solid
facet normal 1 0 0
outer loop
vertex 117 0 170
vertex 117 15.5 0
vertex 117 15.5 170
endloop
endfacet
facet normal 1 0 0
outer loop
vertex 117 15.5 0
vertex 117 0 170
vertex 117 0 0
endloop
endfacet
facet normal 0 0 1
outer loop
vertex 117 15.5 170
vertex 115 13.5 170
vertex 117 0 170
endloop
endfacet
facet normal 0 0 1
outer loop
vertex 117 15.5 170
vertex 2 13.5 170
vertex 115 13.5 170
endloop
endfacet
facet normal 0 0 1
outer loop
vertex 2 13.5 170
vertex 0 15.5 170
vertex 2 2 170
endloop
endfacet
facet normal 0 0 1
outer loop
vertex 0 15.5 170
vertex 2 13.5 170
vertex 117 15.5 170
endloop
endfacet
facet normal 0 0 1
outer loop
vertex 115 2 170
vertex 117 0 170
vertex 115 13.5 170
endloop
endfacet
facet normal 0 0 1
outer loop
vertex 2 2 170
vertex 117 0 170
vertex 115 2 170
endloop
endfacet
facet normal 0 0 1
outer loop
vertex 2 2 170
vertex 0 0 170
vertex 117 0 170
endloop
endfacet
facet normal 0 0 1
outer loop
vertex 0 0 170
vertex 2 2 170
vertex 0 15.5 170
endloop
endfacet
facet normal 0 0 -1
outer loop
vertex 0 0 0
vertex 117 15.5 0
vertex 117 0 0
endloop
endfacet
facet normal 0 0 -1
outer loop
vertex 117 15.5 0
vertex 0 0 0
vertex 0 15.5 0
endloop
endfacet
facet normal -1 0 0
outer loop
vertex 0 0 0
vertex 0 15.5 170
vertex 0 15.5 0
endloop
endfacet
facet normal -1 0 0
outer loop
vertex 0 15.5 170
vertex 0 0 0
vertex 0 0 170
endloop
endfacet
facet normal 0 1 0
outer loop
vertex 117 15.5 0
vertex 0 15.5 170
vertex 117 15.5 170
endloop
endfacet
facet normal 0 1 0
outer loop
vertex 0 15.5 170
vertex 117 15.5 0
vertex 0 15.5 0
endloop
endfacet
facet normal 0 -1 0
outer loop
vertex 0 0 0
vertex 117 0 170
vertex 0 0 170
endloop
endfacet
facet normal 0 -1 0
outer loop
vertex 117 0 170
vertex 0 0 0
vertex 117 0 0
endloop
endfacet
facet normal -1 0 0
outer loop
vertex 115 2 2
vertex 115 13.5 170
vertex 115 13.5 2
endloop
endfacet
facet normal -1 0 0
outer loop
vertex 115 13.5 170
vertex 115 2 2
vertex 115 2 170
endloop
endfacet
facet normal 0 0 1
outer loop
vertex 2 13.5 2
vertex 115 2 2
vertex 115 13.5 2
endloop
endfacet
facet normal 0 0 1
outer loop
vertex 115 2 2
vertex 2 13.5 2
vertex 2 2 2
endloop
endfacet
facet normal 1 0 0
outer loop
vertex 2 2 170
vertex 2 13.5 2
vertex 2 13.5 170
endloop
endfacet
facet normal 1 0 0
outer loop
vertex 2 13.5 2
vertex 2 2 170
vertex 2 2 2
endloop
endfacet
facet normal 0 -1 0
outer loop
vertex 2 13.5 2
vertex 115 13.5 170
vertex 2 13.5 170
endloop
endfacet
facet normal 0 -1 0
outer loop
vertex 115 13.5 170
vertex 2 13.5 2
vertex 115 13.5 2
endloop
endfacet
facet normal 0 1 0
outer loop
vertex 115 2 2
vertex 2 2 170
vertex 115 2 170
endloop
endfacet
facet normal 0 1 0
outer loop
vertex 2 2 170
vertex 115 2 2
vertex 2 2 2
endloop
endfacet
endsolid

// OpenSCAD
dept = 12;
heig = 100;
widt = 108;

echo((176 - 2) / (dept + 2));


module bottom() {
    difference() {
        cube([112,170,80]);
        for (i = [0:11]) {
            translate([2,(i * 14) + 2,1]) {
                cube([widt,12,30]);
            }
        }
        translate([2,2,20]) {
            cube([widt,166,70]);
        }
    }
}

module top() {
    translate([150,0,0]) {
        difference() {
            cube([117,175,10]);
            translate([2,2,2]) {
                cube([113,171,10]);
            }
            for (i = [0:11]) {
                translate([4,(i * 14) + 4,-0.1]) {
                    cube([widt,12,30]);
                }
            }
        }
    }
}

module mold() {
    difference() {
        cube([117,15.5,170]);
        translate([2,2,2]) {
            cube([113,11.5,170]);
        }
    }
}


module tring(leng, thick) {
    translate([0,0,leng]) {
        rotate([90,210,180]) {
            linear_extrude(thick) {
                circle(r=leng, $fn = 3);
            }
        }
    }
}

module fridge_box() {
    difference() {
        cube([112,172,80]);
        for (i = [0:9]) {
            translate([2,(i * 17) + 2,1]) {
                cube([widt,15,90]);
            }
        }
        translate([56,2,12])
        tring(65, 160);
    }
}

mold();
